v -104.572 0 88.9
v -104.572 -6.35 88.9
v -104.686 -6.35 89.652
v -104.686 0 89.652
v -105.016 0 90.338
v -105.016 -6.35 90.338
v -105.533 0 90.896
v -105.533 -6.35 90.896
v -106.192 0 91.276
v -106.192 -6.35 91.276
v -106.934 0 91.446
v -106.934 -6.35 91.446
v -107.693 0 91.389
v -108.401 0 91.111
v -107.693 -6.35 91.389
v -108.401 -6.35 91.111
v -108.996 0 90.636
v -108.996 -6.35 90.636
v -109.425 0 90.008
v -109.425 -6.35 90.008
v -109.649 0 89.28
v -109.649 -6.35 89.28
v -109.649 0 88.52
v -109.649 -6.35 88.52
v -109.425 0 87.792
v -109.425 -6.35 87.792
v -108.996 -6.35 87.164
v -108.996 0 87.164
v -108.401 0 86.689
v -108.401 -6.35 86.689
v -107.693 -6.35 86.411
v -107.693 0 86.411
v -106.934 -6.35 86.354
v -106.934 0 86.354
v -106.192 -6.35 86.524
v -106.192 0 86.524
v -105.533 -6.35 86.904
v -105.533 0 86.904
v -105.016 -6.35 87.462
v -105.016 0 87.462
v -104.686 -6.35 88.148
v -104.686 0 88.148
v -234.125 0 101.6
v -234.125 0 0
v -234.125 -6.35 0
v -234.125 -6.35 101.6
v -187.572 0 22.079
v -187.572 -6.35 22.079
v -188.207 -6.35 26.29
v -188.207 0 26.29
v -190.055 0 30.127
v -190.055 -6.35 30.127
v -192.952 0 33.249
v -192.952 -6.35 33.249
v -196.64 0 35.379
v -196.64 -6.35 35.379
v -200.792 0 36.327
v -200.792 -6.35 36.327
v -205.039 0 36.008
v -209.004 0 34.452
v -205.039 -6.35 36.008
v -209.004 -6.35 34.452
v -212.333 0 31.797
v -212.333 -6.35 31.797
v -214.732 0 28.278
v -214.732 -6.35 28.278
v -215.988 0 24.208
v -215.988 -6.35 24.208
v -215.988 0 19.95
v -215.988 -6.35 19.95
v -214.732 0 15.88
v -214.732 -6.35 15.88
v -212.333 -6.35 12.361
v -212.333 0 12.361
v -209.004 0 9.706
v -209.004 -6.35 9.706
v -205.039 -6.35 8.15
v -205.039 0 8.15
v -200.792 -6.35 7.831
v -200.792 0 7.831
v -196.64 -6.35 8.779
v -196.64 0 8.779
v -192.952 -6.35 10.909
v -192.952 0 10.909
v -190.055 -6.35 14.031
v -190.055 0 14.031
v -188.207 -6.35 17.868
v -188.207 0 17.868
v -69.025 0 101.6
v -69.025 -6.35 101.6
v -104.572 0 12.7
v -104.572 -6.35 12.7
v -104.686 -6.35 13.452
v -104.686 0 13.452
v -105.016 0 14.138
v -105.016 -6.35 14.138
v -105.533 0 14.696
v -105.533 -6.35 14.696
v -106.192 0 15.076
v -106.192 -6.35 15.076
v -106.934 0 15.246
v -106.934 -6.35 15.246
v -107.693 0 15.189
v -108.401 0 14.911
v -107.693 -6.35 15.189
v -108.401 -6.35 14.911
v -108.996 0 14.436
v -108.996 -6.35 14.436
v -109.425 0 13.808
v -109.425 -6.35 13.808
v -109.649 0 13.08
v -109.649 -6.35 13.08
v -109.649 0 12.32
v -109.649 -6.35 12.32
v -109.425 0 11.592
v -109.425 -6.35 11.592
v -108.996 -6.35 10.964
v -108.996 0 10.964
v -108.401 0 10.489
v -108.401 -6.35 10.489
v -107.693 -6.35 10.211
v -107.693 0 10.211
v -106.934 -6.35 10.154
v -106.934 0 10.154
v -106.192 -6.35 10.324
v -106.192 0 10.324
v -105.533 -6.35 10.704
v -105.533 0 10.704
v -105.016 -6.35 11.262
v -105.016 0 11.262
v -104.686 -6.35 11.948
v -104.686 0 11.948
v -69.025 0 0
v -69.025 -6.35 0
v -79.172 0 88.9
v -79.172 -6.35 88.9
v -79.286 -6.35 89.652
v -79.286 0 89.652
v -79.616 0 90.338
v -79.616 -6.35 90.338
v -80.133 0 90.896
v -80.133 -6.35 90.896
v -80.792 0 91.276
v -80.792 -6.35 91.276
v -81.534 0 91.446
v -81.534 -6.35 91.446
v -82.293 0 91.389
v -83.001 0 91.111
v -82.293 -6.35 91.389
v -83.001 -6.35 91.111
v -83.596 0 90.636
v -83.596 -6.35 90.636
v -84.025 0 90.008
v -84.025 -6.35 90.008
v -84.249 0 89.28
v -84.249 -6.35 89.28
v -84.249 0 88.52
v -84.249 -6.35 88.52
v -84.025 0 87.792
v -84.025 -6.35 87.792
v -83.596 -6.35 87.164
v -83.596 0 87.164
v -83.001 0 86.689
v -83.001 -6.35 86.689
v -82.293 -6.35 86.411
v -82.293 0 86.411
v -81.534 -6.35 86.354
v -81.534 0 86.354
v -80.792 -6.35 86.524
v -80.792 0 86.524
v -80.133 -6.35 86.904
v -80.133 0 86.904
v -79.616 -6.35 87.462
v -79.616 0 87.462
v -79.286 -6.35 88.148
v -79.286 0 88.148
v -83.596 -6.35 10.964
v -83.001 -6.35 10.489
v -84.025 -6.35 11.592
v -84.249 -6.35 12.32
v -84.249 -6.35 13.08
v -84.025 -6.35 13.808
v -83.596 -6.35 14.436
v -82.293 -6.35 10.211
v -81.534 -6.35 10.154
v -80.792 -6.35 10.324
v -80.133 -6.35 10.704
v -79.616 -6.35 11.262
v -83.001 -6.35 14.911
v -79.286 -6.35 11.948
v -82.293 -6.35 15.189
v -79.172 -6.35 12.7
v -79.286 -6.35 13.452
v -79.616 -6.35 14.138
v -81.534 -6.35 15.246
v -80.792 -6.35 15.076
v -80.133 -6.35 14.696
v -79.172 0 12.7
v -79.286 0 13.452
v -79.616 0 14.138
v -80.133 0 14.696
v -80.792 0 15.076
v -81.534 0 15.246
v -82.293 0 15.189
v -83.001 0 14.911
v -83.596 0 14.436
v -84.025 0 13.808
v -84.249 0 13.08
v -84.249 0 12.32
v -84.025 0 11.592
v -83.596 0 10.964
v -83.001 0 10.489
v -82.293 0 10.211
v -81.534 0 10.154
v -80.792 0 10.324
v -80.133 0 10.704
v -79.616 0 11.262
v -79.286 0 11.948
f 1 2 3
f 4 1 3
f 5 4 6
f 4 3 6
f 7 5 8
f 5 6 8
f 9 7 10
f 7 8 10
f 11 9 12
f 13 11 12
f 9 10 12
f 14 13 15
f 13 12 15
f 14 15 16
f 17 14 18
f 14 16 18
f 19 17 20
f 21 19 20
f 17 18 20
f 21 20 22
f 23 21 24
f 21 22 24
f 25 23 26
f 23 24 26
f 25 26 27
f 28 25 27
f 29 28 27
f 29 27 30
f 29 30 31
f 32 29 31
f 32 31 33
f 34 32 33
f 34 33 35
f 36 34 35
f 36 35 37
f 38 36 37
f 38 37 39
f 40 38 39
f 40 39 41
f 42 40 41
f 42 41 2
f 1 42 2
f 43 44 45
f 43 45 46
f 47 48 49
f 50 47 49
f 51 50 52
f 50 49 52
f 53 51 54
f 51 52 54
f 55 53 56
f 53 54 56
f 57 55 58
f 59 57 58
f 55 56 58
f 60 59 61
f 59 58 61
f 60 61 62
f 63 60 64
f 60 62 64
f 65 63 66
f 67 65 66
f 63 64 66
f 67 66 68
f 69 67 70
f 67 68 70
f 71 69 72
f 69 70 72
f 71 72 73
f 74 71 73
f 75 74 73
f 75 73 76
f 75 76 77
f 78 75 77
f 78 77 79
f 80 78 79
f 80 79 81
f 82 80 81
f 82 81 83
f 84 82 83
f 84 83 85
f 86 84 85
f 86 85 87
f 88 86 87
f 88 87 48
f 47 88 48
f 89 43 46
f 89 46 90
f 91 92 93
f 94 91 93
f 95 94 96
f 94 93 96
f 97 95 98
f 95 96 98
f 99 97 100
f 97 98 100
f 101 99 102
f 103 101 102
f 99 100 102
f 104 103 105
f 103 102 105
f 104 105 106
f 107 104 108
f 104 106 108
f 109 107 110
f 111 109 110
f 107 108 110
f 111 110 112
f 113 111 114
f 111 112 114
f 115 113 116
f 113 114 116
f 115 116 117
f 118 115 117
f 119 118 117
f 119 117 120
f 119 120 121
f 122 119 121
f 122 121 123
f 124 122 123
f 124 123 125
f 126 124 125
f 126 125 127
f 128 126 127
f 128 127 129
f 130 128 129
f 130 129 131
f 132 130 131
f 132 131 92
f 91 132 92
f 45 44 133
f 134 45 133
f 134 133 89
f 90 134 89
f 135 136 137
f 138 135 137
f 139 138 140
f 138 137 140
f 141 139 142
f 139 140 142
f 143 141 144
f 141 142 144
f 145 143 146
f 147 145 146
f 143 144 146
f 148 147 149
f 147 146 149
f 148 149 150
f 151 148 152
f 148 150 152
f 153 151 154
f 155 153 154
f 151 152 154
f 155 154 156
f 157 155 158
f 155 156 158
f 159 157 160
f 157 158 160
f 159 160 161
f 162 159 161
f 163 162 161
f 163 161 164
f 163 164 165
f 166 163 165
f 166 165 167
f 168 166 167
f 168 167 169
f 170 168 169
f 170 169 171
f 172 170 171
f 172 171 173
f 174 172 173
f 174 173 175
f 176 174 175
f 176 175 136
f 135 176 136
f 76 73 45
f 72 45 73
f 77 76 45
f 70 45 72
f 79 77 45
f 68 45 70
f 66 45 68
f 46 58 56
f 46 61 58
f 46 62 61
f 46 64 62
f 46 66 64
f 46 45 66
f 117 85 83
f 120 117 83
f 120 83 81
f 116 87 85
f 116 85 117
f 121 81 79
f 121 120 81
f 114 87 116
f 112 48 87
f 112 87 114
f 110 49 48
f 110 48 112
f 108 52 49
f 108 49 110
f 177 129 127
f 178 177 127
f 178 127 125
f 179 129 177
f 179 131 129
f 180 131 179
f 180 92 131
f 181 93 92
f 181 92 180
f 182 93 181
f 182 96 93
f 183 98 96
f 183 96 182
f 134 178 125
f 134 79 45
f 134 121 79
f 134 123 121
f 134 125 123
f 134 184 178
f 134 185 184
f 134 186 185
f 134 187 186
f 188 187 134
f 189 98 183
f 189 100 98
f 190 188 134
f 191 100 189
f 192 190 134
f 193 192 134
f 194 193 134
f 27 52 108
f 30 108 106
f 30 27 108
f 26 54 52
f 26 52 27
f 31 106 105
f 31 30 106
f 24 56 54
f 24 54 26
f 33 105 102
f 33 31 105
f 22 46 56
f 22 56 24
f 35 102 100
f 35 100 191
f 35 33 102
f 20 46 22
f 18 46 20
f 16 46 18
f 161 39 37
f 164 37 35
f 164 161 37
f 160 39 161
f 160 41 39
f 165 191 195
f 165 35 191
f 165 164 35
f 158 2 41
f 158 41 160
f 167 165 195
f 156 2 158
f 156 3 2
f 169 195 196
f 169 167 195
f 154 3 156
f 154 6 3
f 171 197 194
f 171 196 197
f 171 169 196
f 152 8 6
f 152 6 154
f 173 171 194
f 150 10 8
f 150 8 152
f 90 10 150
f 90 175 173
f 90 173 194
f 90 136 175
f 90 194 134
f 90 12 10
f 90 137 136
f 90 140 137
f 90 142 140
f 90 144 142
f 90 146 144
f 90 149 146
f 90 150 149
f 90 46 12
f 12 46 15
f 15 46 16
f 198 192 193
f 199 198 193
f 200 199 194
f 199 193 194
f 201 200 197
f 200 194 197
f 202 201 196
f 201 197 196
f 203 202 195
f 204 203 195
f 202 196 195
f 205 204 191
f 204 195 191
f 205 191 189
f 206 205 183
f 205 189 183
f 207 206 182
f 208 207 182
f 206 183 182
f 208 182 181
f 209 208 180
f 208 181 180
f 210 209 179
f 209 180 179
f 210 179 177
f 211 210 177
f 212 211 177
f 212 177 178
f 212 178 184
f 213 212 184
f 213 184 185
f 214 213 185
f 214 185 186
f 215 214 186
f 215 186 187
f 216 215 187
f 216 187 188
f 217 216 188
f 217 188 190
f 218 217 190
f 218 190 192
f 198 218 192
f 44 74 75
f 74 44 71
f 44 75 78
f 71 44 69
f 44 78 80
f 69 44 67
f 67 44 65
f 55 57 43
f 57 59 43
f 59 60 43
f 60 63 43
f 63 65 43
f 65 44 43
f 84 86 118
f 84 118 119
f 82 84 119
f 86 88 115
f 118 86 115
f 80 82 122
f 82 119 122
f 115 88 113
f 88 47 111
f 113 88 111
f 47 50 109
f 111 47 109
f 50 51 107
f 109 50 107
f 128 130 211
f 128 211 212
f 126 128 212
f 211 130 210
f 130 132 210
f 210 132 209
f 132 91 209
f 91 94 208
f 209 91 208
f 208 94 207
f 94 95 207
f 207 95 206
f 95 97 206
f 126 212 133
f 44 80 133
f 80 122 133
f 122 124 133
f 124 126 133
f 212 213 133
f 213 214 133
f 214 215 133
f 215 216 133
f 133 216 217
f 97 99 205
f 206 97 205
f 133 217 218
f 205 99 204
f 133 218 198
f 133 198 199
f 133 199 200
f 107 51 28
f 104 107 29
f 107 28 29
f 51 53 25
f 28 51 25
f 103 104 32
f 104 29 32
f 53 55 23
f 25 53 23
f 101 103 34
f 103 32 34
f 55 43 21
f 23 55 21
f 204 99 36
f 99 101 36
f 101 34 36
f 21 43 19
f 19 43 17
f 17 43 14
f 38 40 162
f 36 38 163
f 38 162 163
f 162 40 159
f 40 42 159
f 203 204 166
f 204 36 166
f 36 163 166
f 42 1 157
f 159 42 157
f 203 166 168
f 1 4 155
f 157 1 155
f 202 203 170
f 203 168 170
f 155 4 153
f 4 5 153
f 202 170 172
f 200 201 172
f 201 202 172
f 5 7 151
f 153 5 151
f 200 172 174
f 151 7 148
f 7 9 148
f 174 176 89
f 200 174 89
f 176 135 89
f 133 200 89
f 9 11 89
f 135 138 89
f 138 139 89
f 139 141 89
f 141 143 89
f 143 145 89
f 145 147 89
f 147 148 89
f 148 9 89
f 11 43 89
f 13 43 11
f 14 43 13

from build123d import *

# Parameters (mm, degrees)
F0_W     = 165.1
F0_H     = 101.6
F1_DEPTH = 6.35
F2_R     = 2.5527
F3_DEPTH = 25.4
F4_R     = 14.2875
F5_DEPTH = 25.4


with BuildPart() as f1:
    # F0 (on Front) → F1 (new body)
    with BuildSketch(Plane.XZ):
        with Locations((-151.574861, 50.8)):
            Rectangle(F0_W, F0_H)
    extrude(amount=F1_DEPTH)

    # F2 (on face) → F3 (cut)
    with BuildSketch(Plane.XZ.offset(6.35)):
        with Locations((-107.124861, 12.7)):
            Circle(F2_R)
        with Locations((-81.724861, 12.7)):
            Circle(F2_R)
        with Locations((-107.124861, 88.9)):
            Circle(F2_R)
        with Locations((-81.724861, 88.9)):
            Circle(F2_R)
    extrude(amount=-F3_DEPTH, mode=Mode.SUBTRACT)

    # F4 (on face) → F5 (cut)
    with BuildSketch(Plane.XZ.offset(6.35)):
        with Locations((-201.859877, 22.078976)):
            Circle(F4_R)
    extrude(amount=-F5_DEPTH, mode=Mode.SUBTRACT)


solid = f1.part
